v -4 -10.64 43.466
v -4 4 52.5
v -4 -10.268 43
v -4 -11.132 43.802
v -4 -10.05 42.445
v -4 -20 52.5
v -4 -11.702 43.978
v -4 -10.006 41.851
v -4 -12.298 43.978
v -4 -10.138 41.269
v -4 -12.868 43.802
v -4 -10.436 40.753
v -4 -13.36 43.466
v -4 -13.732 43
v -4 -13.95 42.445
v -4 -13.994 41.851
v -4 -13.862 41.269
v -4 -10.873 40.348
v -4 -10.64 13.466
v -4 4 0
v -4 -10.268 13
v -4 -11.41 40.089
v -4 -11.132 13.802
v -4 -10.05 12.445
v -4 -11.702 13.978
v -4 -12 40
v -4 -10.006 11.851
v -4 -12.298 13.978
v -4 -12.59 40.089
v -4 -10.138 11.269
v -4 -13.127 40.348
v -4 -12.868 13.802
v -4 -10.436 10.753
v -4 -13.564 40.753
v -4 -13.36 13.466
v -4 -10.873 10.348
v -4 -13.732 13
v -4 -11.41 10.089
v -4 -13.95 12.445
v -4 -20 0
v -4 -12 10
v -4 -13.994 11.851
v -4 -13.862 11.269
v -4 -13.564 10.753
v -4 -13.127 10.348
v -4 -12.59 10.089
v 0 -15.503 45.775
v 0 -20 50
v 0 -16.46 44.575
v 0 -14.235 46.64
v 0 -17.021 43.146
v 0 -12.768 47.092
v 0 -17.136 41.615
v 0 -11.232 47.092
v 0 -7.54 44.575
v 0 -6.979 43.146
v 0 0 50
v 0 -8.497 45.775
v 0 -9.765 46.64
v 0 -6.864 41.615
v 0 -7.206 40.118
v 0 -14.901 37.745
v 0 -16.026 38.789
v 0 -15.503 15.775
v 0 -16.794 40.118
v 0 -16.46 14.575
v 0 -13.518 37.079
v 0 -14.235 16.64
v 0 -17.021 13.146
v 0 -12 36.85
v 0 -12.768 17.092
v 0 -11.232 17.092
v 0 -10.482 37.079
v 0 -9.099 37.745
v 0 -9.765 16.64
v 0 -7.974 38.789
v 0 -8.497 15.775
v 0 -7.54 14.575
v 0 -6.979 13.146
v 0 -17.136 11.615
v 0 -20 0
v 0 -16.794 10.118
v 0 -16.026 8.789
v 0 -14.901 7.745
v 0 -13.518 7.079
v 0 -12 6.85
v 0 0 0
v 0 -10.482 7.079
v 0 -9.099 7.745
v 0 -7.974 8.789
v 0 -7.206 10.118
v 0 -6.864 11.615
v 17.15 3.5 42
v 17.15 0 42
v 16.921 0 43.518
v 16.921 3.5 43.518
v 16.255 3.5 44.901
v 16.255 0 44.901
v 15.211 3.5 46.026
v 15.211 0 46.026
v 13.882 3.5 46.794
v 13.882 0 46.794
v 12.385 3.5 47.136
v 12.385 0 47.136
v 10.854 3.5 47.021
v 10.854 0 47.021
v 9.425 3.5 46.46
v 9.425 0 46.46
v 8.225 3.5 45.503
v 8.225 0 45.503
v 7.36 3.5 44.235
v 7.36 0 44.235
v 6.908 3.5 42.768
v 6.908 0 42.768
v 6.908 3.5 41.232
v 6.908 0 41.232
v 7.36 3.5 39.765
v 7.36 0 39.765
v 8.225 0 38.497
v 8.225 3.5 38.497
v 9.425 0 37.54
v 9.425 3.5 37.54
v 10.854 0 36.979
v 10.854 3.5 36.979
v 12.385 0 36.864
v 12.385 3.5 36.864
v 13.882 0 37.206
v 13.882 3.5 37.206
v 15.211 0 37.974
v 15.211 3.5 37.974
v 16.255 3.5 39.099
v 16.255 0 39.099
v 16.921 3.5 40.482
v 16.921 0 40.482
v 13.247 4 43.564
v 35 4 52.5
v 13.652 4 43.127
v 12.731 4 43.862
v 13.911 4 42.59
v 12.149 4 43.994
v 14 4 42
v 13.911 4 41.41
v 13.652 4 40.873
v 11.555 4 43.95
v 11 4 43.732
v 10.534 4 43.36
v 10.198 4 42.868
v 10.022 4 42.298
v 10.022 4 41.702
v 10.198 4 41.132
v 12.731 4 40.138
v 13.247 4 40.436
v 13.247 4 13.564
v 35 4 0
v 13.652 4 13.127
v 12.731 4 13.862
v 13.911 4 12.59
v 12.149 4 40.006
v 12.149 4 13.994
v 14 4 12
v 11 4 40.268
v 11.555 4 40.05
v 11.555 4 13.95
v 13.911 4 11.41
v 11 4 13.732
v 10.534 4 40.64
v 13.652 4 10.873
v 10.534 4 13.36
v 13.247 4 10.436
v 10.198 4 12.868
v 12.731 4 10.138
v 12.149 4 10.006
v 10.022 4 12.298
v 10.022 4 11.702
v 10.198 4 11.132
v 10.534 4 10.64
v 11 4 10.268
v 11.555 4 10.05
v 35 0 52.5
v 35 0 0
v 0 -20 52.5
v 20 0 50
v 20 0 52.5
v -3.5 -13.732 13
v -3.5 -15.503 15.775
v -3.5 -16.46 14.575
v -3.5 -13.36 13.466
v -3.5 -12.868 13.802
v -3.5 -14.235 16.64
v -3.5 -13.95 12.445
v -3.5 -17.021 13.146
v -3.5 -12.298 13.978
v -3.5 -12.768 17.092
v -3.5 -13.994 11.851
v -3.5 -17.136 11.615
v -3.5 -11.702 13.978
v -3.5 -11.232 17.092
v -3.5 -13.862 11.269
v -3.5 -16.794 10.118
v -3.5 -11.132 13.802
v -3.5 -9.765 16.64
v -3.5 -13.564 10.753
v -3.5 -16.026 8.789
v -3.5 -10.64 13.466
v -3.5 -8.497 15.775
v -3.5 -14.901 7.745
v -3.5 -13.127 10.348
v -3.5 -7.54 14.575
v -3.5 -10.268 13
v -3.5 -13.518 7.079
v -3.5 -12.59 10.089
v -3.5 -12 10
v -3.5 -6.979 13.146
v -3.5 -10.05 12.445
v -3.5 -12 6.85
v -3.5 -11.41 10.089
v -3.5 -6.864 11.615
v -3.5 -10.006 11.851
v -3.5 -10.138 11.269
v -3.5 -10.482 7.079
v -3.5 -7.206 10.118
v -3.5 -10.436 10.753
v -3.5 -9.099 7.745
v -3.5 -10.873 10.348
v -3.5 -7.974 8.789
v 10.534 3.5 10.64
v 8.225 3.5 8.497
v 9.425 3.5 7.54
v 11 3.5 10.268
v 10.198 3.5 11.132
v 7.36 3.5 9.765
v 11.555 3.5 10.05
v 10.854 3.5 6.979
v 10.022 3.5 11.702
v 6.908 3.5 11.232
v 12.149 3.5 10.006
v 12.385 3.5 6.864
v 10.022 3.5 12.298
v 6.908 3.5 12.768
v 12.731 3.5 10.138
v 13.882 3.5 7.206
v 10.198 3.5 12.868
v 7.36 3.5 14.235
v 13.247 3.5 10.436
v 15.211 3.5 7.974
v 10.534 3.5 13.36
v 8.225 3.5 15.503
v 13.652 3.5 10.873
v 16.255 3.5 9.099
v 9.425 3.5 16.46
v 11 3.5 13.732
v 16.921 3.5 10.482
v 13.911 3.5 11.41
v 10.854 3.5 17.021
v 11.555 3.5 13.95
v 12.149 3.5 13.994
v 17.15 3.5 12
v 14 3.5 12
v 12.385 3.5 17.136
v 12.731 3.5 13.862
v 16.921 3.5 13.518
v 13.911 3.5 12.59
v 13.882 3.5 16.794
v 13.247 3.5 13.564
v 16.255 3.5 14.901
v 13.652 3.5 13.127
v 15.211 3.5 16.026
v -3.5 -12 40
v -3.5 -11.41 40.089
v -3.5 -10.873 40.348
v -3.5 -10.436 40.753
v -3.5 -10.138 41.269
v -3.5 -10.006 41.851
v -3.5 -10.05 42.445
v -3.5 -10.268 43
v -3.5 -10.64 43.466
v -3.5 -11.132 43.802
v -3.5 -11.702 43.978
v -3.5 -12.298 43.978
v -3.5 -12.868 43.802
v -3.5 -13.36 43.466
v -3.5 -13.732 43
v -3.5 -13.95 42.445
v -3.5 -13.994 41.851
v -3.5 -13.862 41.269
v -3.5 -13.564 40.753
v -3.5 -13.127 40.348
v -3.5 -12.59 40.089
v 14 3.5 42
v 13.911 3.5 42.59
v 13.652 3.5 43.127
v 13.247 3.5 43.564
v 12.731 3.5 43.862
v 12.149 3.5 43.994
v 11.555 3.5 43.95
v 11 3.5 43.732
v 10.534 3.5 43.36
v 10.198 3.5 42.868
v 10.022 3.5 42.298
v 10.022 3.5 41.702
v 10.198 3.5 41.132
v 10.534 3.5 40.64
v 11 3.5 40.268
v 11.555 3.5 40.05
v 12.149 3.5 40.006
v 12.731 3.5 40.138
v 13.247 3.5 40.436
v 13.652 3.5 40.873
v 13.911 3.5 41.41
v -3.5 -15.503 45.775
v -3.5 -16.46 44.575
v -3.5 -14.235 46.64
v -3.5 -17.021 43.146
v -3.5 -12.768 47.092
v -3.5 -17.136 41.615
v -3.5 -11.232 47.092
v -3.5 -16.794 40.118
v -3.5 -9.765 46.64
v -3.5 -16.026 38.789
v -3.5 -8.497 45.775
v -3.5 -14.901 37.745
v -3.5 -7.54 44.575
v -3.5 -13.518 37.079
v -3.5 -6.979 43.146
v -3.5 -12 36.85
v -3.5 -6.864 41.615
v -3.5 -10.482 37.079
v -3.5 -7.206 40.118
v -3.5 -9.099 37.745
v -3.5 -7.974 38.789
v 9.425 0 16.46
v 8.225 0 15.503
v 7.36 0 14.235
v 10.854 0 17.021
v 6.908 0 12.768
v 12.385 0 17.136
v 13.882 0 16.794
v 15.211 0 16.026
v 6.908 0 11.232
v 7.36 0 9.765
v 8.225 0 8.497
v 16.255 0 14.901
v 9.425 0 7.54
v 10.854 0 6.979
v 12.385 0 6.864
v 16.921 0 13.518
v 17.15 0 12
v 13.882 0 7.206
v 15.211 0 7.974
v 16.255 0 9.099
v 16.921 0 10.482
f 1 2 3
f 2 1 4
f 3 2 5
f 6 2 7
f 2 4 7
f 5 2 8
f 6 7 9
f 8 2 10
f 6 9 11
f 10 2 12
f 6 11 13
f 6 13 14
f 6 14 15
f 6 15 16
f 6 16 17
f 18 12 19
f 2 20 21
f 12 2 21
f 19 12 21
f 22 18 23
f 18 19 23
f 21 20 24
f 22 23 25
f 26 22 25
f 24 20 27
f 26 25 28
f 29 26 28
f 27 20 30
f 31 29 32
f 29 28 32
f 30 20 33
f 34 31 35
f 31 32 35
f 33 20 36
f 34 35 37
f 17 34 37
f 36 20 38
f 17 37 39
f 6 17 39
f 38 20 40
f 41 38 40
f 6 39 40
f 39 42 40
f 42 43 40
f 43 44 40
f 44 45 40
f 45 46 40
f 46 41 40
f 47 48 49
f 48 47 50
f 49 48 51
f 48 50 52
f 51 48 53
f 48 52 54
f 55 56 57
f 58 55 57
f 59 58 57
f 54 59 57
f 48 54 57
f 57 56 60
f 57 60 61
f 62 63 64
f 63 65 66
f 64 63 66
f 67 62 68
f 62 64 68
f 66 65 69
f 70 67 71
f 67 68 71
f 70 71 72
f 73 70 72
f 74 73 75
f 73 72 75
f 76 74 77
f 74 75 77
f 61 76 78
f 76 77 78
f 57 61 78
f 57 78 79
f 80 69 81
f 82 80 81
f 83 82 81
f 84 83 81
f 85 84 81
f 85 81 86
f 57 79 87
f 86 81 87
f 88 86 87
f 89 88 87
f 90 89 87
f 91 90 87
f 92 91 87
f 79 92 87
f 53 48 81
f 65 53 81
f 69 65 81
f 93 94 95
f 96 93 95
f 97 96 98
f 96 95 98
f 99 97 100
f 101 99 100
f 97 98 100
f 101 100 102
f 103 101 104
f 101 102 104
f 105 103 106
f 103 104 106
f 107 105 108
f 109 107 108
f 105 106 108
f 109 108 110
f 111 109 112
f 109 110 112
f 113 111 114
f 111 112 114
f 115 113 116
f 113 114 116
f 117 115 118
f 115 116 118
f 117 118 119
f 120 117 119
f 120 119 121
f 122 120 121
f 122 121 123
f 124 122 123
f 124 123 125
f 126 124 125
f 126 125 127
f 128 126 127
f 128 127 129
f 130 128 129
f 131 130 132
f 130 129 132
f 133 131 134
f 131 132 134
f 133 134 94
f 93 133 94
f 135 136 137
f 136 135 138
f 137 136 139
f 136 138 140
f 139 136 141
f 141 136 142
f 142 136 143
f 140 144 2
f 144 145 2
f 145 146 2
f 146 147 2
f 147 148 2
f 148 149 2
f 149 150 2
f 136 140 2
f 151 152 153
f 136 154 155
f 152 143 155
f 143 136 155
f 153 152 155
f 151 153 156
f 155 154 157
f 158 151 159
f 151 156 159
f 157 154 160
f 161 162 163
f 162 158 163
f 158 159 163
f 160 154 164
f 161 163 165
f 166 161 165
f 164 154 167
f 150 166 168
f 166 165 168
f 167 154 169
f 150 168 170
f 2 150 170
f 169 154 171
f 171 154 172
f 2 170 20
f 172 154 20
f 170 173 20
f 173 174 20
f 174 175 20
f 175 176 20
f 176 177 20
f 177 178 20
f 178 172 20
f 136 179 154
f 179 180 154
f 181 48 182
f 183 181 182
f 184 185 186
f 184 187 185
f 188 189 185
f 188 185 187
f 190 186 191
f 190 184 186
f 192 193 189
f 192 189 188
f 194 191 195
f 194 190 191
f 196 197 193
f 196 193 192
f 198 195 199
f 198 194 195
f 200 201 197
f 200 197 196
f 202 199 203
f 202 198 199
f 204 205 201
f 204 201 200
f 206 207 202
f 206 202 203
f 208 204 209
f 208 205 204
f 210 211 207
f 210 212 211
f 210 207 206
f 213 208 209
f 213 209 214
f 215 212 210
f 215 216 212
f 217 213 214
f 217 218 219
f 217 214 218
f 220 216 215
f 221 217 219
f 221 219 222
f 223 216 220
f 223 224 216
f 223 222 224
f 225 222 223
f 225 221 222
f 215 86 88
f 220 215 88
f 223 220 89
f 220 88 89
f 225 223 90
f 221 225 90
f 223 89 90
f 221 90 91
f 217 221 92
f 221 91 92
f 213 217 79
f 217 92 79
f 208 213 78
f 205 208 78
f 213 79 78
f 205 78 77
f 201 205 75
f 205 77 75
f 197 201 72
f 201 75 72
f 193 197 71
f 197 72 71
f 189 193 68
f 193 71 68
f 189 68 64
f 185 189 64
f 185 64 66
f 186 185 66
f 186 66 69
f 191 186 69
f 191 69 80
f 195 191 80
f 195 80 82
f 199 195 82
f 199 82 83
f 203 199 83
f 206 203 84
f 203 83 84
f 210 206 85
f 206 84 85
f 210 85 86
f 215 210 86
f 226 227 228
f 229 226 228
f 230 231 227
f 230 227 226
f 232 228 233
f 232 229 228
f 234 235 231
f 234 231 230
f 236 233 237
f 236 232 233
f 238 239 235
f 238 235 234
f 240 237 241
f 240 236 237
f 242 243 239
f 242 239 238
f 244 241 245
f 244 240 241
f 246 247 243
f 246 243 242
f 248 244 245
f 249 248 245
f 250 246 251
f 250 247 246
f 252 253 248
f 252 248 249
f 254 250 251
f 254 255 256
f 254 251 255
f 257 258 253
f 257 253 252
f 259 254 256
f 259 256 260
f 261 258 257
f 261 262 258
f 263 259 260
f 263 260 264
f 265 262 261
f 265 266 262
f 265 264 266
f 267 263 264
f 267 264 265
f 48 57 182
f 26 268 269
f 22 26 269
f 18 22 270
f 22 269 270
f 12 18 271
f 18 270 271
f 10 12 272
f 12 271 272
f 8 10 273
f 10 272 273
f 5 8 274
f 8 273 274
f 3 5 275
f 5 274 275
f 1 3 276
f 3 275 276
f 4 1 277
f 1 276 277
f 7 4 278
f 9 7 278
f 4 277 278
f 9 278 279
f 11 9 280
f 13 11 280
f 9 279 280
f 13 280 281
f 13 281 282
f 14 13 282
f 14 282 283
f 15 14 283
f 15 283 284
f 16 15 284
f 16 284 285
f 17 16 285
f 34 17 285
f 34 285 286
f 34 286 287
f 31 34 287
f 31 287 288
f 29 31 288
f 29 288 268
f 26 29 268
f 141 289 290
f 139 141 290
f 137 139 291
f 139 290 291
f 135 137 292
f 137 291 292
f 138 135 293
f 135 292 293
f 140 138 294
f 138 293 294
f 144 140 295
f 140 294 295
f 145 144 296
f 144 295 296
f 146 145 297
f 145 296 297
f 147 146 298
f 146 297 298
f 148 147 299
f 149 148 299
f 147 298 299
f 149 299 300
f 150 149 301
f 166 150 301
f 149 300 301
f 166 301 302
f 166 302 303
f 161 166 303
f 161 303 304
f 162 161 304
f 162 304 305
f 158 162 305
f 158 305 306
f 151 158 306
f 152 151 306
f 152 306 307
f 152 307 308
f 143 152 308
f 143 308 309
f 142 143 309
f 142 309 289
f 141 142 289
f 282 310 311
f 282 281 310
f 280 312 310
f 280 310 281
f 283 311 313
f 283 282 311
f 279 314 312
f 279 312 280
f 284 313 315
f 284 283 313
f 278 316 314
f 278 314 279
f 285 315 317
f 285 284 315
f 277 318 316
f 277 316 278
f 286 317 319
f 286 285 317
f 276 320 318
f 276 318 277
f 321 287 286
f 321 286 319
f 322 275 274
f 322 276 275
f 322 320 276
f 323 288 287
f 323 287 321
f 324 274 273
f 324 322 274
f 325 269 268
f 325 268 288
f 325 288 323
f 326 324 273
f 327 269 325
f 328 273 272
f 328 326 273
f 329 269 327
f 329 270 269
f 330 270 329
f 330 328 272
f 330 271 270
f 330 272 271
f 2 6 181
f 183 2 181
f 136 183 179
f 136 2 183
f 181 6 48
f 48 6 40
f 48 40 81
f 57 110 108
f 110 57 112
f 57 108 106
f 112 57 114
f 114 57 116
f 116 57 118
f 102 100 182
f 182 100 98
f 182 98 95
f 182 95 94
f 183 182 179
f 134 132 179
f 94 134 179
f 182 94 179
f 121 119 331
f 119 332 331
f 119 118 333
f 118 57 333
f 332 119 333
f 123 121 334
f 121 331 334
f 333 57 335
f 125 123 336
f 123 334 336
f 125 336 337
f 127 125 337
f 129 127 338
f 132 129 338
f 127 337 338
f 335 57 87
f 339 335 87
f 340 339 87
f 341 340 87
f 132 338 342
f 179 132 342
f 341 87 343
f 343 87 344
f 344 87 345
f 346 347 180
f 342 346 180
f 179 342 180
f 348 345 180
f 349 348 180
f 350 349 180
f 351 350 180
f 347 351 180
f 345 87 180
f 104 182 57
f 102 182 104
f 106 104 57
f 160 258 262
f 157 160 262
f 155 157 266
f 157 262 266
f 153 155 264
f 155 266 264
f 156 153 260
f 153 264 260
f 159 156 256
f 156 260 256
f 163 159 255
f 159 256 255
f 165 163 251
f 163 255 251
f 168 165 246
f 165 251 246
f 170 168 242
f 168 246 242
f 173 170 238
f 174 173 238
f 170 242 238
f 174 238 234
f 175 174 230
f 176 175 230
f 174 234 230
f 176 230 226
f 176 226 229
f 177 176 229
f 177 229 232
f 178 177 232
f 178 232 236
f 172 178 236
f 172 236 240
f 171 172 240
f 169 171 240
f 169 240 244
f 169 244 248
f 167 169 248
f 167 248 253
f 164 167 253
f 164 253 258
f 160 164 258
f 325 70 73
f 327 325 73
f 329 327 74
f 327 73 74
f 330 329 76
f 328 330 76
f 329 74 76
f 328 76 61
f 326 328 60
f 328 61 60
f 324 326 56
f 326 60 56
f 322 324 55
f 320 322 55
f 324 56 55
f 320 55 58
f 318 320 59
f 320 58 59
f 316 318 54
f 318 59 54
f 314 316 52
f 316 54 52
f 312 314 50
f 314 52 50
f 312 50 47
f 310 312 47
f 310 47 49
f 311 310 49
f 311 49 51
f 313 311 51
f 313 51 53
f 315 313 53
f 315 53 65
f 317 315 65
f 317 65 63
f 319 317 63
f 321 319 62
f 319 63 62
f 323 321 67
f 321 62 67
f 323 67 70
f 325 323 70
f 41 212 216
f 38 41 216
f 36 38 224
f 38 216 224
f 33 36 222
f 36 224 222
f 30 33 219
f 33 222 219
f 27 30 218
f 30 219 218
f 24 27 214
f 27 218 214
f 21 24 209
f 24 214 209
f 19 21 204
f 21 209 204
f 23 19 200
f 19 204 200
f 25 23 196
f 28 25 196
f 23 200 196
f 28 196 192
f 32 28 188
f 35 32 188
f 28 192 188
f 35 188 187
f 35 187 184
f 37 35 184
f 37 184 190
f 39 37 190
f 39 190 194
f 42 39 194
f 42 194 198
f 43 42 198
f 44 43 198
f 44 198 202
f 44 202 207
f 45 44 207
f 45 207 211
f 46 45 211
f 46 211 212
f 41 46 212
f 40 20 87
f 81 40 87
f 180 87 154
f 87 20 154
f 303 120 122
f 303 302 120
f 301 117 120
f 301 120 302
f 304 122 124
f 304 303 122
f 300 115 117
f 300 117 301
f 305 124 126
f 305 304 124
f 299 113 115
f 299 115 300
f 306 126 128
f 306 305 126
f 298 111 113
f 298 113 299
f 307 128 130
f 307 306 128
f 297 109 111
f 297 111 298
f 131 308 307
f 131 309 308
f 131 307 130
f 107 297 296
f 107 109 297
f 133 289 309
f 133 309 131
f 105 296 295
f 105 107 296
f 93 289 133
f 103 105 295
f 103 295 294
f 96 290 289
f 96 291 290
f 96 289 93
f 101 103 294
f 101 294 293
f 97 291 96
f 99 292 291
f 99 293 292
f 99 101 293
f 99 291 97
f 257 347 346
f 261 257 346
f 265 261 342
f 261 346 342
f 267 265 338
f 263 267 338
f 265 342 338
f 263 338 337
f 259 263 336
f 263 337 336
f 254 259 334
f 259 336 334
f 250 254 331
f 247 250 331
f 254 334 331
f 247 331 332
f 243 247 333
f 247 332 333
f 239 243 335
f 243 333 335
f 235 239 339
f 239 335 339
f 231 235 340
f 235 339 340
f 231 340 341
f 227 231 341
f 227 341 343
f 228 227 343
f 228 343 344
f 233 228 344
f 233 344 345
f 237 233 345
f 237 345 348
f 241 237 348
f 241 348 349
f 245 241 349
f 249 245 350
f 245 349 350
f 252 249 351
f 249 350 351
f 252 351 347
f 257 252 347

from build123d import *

# Parameters (mm, degrees)
RESSALTO_EXTRUS_O1_DEPTH = 50
ESBO_O2_R                = 5.15
CORTE_EXTRUS_O1_DEPTH    = 3.5
ESBO_O3_R                = 5.15
CORTE_EXTRUS_O2_DEPTH    = 3.5
RESSALTO_EXTRUS_O2_DEPTH = 2.5
ESBO_O5_R                = 2
CORTE_EXTRUS_O3_DEPTH    = 10
ESBO_O6_R                = 2
CORTE_EXTRUS_O4_DEPTH    = 10


with BuildPart() as part:
    # Esboço1 → Ressalto-extrusão1 (new body)
    with BuildSketch(Plane.XY):
        Polygon((0, 0), (35, 0), (35, 4), (-4, 4), (-4, -20), (0, -20), align=None)
    extrude(amount=RESSALTO_EXTRUS_O1_DEPTH)

    # Esboço2 → Corte-extrusão1 (cut)
    with BuildSketch(Plane(origin=(0, 0, 0), x_dir=(0, 0, -1), z_dir=(1, 0, 0))):
        with Locations((-42, -12)):
            Circle(ESBO_O2_R)
        with Locations((-12, -12)):
            Circle(ESBO_O2_R)
    extrude(amount=-CORTE_EXTRUS_O1_DEPTH, mode=Mode.SUBTRACT)

    # Esboço3 → Corte-extrusão2 (cut)
    with BuildSketch(Plane.XZ):
        with Locations((12, 42)):
            Circle(ESBO_O3_R)
        with Locations((12, 12)):
            Circle(ESBO_O3_R)
    extrude(amount=-CORTE_EXTRUS_O2_DEPTH, mode=Mode.SUBTRACT)

    # Esboço4 → Ressalto-extrusão2 (add)
    with BuildSketch(Plane.XY.offset(50)):
        Polygon((0, -20), (20, 0), (35, 0), (35, 4), (-4, 4), (-4, -20), align=None)
    extrude(amount=RESSALTO_EXTRUS_O2_DEPTH)

    # Esboço5 → Corte-extrusão3 (cut)
    with BuildSketch(Plane.XZ.offset(-3.5)):
        with Locations((12, 42)):
            Circle(ESBO_O5_R)
        with Locations((12, 12)):
            Circle(ESBO_O5_R)
    extrude(amount=-CORTE_EXTRUS_O3_DEPTH, mode=Mode.SUBTRACT)

    # Esboço6 → Corte-extrusão4 (cut)
    with BuildSketch(Plane(origin=(-3.5, 0, 0), x_dir=(0, 0, -1), z_dir=(1, 0, 0))):
        with Locations((-42, -12)):
            Circle(ESBO_O6_R)
        with Locations((-12, -12)):
            Circle(ESBO_O6_R)
    extrude(amount=-CORTE_EXTRUS_O4_DEPTH, mode=Mode.SUBTRACT)


solid = part.part
